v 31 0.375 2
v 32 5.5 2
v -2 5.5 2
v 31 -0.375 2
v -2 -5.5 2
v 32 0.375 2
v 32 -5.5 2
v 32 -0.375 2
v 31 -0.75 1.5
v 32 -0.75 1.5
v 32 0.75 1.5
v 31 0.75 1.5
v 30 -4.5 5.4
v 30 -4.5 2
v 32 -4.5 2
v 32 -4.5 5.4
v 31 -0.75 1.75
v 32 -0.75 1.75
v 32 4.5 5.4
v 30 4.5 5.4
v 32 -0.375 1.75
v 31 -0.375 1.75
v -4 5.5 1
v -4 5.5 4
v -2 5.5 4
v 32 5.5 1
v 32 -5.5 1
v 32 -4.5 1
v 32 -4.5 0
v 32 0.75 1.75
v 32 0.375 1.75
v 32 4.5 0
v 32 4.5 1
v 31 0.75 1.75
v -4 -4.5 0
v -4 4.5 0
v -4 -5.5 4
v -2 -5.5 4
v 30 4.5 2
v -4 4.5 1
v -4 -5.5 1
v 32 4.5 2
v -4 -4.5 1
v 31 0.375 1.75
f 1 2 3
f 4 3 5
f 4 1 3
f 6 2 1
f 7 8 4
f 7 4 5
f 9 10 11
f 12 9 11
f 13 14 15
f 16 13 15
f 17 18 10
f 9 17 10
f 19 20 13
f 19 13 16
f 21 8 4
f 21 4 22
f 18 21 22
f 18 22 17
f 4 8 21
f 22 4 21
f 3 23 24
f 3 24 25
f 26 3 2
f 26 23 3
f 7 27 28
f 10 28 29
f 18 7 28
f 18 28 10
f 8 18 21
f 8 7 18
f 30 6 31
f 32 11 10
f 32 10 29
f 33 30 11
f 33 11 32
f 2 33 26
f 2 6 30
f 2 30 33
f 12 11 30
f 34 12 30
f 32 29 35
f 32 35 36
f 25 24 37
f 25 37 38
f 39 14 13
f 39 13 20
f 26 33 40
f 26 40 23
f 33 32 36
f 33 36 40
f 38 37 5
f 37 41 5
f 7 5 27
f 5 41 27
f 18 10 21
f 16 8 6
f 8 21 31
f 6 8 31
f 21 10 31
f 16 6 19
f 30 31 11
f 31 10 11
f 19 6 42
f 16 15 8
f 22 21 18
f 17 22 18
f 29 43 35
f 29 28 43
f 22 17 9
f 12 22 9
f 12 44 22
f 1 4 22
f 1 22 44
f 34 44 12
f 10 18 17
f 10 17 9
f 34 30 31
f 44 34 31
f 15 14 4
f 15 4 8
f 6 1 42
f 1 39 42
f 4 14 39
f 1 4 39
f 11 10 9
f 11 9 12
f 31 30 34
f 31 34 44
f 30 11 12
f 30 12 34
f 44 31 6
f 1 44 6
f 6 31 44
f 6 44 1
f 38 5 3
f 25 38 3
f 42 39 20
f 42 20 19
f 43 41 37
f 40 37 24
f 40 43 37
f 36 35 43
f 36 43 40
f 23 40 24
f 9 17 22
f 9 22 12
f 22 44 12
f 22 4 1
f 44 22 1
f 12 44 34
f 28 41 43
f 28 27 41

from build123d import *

# Parameters (mm, degrees)
F0_W          = 1
F0_H          = 1
F1_DEPTH      = 32
F1_DEPTH_BACK = 4
F2_W          = 2
F2_H          = 9
F3_DEPTH      = 3.4
F5_DEPTH      = 1
F6_DEPTH      = 1
F7_W          = 2
F7_H          = 11
F8_DEPTH      = 2


with BuildPart() as f1:
    # F0 (on Right) → F1 (new body, two sides)
    with BuildSketch(Plane.YZ) as f1_sk:
        Polygon((4.5, 1), (4.5, 2), (-4.5, 2), (-4.5, 1), (-4.5, 0), (4.5, 0), align=None)
        with Locations((5, 1.5)):
            Rectangle(F0_W, F0_H)
        with Locations((-5, 1.5)):
            Rectangle(F0_W, F0_H)
    extrude(amount=F1_DEPTH)
    extrude(f1_sk.sketch, amount=-F1_DEPTH_BACK)

    # F4 (on face) → F5 (cut)
    with BuildSketch(Plane.YZ.offset(32)):
        Polygon((0.375, 2), (-0.375, 2), (-0.375, 1.75), (-0.75, 1.75), (-0.75, 1.5), (0.75, 1.5), (0.75, 1.75), (0.375, 1.75), align=None)
    extrude(amount=-F5_DEPTH, mode=Mode.SUBTRACT)

    # F7 (on face) → F8 (join)
    with BuildSketch(Plane.XY.offset(2)):
        with Locations((-3, 0)):
            Rectangle(F7_W, F7_H)
    extrude(amount=F8_DEPTH)


with BuildPart() as f3:
    # F2 (on face) → F3 (new body)
    with BuildSketch(Plane.XY.offset(2)):
        with Locations((31, 0)):
            Rectangle(F2_W, F2_H)
    extrude(amount=F3_DEPTH)

    # F4 (on face) → F6 (join)
    with BuildSketch(Plane.YZ.offset(32)):
        Polygon((0.375, 2), (-0.375, 2), (-0.375, 1.75), (-0.75, 1.75), (-0.75, 1.5), (0.75, 1.5), (0.75, 1.75), (0.375, 1.75), align=None)
    extrude(amount=-F6_DEPTH)


solid = Compound([f1.part, f3.part])
